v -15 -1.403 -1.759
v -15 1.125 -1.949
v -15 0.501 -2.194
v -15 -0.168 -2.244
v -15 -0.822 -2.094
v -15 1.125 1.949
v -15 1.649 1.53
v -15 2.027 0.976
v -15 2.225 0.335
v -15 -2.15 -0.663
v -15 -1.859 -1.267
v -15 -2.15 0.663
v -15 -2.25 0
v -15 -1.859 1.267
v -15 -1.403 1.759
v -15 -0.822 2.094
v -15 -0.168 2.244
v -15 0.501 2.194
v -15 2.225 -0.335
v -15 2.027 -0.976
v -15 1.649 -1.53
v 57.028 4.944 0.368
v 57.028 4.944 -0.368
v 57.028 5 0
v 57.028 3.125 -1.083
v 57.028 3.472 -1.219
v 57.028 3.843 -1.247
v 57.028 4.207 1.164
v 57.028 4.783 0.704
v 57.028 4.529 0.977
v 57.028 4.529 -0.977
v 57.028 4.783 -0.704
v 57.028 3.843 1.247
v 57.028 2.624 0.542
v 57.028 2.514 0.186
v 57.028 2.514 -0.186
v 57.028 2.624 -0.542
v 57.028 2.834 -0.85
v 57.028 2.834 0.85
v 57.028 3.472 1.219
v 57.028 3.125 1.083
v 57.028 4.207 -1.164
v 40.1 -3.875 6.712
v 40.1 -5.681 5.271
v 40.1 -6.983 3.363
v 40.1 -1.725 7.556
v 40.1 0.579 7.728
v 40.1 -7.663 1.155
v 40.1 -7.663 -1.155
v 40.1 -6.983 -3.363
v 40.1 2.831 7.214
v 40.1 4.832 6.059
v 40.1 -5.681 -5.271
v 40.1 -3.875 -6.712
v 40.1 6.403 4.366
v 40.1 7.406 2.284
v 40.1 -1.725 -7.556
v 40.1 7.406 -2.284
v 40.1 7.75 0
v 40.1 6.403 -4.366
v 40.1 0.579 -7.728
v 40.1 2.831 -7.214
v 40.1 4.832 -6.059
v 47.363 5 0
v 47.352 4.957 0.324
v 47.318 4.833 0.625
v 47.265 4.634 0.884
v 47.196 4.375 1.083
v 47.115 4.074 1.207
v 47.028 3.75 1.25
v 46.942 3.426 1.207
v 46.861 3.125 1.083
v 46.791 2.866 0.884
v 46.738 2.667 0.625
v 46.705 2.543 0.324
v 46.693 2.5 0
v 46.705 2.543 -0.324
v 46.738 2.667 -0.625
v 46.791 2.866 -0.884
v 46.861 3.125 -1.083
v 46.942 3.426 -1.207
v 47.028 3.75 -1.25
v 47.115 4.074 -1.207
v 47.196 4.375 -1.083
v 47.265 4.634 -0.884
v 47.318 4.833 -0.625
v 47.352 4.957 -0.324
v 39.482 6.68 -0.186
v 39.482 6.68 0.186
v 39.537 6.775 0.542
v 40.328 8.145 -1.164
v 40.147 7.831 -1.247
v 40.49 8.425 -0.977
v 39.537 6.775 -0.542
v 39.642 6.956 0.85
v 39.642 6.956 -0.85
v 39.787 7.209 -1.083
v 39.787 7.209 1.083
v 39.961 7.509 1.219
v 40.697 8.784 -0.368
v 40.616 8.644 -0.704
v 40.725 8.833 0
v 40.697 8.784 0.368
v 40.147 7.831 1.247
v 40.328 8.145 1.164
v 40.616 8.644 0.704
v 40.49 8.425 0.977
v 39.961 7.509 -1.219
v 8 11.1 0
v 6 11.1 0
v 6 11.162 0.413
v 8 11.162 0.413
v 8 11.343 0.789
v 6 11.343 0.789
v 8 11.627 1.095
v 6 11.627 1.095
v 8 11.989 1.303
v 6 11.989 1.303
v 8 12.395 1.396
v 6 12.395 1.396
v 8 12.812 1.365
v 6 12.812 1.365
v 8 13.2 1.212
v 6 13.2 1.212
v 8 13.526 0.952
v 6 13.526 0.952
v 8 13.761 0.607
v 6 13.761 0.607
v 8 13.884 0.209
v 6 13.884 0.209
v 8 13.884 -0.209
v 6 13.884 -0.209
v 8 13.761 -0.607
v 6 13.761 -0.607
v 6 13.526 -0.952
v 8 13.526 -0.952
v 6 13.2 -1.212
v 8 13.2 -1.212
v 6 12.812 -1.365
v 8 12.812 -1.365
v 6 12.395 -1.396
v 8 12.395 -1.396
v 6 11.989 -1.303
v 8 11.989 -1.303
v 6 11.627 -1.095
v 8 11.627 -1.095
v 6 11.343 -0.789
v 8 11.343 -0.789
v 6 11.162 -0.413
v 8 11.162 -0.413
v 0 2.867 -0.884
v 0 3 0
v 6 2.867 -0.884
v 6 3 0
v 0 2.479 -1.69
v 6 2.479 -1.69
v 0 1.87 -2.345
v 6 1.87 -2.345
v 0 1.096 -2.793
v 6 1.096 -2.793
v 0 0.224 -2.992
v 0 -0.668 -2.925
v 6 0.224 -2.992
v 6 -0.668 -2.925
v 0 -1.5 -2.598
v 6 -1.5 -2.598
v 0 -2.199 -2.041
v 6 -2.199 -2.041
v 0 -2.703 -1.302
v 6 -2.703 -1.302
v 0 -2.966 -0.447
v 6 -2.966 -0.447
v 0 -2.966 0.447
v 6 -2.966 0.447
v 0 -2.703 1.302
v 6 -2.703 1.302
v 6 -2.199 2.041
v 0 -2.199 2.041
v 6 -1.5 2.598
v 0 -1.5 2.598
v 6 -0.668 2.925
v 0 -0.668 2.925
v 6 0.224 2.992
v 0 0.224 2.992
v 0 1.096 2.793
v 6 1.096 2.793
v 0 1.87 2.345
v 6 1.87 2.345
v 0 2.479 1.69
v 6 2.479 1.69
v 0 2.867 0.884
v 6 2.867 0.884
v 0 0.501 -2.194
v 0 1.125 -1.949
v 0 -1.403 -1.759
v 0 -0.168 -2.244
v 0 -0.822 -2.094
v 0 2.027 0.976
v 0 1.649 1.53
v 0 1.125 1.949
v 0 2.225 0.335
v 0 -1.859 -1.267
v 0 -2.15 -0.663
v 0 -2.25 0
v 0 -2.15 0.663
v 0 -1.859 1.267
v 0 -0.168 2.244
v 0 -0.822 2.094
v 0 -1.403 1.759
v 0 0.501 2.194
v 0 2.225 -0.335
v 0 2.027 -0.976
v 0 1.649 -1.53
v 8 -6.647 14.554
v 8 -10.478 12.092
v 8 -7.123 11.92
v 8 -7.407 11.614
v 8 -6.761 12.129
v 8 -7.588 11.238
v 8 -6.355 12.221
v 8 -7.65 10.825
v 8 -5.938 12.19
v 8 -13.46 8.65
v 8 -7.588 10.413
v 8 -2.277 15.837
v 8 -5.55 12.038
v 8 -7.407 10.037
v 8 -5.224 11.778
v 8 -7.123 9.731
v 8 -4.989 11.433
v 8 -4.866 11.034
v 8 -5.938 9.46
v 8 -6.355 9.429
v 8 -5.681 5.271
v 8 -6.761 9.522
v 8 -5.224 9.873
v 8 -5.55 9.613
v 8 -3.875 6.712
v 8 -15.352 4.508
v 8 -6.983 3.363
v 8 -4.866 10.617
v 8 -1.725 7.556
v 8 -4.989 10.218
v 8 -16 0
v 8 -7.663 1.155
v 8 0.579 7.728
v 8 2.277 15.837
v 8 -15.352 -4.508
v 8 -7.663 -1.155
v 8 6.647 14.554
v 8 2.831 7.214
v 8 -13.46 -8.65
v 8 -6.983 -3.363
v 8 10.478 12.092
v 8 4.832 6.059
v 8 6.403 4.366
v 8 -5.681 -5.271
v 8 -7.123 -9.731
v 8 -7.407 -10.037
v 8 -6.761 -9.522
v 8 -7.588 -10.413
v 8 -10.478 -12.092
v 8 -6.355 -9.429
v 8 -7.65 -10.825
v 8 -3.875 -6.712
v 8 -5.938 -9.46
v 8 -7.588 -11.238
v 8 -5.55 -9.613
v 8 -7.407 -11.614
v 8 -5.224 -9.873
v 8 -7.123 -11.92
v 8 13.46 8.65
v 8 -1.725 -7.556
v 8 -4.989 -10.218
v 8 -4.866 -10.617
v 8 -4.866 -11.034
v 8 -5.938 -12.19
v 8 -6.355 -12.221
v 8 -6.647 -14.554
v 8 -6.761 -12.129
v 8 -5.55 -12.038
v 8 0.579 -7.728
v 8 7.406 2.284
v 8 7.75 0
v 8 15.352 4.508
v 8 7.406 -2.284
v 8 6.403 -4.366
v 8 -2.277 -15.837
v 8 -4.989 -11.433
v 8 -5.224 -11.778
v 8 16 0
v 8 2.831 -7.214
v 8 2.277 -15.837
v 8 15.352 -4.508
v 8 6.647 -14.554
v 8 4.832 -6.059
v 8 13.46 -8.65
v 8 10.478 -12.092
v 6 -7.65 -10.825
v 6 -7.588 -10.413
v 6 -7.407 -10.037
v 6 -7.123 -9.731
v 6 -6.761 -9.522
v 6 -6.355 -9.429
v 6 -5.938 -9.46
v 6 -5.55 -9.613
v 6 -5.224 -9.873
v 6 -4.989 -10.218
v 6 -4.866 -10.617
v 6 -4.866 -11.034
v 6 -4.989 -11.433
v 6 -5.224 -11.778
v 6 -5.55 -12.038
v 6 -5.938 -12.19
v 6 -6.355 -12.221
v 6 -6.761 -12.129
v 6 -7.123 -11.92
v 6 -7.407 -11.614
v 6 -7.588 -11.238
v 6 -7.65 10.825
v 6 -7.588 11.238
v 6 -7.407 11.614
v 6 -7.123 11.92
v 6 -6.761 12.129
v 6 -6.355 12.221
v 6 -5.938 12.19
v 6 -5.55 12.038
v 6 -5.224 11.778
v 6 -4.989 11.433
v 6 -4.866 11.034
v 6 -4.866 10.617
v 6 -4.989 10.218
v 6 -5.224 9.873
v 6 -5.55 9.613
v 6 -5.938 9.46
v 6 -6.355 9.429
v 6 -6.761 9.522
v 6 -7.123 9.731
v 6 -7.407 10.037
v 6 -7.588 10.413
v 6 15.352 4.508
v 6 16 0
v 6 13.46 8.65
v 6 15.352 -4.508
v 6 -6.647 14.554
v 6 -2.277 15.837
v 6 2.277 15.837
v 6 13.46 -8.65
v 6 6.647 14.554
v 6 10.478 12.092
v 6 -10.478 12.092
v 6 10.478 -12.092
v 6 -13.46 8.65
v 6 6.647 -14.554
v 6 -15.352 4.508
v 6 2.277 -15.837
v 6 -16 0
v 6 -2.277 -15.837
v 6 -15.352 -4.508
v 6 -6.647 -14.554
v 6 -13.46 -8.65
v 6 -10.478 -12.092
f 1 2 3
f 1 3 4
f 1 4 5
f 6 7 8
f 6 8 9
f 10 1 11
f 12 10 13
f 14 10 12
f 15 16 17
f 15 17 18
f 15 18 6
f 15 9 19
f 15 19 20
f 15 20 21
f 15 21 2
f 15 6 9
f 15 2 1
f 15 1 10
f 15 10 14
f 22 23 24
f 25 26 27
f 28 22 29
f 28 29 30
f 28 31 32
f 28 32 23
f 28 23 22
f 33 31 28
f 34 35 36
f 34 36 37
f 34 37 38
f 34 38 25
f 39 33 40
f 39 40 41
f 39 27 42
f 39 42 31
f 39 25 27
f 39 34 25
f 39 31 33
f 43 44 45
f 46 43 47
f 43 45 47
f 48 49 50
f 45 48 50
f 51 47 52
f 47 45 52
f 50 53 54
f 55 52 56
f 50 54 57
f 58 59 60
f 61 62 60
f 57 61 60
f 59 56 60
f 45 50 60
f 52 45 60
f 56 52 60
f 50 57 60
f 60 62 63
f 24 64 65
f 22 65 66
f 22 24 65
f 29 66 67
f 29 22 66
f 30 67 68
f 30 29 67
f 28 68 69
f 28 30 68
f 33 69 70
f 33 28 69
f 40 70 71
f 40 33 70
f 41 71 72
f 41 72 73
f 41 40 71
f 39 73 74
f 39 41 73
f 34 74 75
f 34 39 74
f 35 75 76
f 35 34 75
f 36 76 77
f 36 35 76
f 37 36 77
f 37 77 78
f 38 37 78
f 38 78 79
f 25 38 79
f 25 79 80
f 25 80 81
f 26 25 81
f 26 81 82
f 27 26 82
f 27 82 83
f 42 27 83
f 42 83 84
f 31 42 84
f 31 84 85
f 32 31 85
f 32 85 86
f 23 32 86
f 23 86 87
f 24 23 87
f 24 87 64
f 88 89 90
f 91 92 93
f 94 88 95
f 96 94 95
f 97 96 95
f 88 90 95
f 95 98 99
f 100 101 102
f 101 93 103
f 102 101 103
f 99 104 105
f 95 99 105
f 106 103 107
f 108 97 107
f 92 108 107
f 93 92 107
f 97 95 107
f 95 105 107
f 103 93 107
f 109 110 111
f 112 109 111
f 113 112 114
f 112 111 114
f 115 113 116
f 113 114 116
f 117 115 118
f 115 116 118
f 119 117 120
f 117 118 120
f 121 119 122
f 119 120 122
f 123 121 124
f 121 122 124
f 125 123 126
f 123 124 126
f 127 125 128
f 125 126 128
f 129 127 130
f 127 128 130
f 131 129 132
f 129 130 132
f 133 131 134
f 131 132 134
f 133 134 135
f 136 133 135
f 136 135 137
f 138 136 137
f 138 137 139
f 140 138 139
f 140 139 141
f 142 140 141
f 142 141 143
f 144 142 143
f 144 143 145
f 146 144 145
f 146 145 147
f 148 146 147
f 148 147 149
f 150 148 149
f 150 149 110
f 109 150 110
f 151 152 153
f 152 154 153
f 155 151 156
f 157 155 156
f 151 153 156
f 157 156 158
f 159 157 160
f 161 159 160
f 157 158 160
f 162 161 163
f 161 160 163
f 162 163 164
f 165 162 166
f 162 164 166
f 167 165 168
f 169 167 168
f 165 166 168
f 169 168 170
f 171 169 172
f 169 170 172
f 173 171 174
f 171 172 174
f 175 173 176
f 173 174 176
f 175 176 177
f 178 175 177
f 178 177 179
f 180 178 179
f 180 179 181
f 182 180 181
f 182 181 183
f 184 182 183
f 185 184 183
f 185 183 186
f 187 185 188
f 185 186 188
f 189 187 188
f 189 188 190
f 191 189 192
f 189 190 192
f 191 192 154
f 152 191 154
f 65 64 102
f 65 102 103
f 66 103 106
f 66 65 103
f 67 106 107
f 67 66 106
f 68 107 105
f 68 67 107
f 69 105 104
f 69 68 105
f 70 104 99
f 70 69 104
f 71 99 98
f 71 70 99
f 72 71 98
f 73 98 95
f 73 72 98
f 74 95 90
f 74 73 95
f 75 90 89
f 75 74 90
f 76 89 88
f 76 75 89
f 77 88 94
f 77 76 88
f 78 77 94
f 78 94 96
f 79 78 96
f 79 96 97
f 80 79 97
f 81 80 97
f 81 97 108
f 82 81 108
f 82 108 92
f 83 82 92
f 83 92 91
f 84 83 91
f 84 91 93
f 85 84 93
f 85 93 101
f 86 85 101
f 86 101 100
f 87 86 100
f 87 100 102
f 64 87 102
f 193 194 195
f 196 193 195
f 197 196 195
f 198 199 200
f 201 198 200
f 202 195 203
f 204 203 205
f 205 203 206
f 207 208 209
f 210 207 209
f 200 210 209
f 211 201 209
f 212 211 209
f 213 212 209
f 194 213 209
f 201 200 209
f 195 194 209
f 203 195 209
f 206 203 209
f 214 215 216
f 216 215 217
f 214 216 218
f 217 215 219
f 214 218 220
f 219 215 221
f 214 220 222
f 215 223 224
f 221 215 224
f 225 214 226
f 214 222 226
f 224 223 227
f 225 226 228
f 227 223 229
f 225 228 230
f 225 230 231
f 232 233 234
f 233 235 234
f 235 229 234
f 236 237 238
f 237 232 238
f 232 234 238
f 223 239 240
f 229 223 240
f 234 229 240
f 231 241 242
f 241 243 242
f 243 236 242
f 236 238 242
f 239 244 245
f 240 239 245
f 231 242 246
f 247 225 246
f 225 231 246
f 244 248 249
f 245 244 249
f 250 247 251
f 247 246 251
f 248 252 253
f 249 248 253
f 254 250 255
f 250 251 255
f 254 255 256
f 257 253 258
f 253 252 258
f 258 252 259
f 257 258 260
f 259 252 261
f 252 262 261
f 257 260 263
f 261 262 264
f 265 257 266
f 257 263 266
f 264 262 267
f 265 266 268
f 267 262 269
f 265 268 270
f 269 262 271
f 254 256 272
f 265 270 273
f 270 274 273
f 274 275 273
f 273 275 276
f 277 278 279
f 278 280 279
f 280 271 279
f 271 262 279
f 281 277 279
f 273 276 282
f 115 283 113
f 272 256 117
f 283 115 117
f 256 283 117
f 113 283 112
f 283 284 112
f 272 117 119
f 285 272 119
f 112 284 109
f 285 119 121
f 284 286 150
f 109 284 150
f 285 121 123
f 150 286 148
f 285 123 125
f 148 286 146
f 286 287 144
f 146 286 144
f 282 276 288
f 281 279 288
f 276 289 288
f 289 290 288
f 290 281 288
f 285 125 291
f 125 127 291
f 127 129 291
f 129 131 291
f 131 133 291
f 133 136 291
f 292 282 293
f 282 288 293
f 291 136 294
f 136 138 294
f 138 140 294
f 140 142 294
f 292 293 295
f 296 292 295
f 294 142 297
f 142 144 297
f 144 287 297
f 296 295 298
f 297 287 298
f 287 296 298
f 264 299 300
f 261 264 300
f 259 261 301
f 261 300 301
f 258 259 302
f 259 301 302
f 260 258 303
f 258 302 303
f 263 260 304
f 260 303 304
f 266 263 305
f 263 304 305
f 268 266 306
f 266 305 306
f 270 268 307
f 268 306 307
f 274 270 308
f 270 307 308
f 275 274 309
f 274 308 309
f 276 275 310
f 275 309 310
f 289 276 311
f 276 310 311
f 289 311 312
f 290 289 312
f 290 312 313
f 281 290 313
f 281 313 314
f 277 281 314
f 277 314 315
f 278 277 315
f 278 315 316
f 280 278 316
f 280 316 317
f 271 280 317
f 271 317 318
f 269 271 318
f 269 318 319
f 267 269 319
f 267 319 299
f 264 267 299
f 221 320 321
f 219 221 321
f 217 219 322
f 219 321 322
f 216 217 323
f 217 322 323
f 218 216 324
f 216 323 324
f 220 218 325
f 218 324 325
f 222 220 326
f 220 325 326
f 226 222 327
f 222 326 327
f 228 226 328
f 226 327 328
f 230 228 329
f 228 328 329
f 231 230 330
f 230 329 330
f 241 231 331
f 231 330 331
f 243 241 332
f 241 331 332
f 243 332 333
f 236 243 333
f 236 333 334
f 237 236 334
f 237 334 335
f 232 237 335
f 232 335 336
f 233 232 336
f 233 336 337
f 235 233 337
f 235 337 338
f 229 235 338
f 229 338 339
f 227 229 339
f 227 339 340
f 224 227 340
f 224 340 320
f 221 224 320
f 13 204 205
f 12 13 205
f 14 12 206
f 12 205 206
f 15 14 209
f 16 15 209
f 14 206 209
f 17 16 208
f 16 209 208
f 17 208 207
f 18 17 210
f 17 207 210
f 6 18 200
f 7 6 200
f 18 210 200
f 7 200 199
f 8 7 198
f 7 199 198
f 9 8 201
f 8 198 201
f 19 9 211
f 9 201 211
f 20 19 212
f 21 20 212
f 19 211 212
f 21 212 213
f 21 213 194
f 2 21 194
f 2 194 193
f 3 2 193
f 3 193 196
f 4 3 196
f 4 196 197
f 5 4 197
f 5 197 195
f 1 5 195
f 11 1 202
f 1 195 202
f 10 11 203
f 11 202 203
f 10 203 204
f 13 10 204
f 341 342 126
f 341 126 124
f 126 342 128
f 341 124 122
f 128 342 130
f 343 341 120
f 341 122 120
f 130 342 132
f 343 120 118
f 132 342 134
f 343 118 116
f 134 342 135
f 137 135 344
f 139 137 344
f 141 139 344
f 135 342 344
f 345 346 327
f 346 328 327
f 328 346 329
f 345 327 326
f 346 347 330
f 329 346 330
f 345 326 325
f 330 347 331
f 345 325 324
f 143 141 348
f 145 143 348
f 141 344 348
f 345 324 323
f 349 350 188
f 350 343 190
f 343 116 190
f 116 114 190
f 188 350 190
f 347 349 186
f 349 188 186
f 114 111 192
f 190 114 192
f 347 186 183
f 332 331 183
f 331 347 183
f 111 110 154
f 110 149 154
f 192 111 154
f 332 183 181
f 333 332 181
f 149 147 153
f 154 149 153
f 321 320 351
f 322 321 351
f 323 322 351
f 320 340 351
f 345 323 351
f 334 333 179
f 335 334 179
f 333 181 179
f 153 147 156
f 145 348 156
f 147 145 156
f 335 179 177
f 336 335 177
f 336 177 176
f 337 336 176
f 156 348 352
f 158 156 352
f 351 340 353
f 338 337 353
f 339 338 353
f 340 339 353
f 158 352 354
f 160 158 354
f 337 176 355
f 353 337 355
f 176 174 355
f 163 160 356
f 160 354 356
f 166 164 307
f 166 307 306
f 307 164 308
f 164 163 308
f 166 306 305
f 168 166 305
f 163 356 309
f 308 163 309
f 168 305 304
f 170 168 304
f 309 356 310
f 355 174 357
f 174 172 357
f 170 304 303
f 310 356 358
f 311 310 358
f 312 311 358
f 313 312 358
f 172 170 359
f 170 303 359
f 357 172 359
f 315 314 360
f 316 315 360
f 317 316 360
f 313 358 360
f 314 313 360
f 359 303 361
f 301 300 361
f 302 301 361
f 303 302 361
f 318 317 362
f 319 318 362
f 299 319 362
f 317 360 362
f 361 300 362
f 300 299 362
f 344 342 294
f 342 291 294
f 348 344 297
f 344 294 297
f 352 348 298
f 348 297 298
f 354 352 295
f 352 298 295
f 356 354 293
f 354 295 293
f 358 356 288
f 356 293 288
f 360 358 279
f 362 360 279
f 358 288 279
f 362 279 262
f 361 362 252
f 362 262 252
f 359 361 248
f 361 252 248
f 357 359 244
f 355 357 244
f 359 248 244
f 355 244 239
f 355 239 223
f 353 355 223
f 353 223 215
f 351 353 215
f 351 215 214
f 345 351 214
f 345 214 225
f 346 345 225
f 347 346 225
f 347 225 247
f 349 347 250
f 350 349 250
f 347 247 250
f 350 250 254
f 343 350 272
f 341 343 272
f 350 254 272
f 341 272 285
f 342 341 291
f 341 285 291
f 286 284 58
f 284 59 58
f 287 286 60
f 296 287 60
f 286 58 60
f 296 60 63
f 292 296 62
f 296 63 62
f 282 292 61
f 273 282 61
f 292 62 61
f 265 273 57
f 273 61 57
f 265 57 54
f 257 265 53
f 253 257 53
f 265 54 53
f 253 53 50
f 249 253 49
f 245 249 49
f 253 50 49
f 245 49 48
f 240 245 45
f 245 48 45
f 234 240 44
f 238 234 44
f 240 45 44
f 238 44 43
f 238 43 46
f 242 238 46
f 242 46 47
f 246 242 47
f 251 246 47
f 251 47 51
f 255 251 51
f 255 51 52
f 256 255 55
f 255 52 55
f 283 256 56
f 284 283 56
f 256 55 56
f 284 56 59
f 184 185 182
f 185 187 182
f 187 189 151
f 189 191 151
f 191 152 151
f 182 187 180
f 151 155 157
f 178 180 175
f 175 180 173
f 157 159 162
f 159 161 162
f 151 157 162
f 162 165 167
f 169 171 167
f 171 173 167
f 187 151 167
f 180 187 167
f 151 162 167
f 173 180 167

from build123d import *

# Parameters (mm, degrees)
SKETCH_2_R          = 2.25
EXTRUDE_1_DEPTH     = 15
SKETCH_3_R          = 1.4
CUT_EXTRUDE_1_DEPTH = 41.924442574
SWEEP_1_PROFILE_R   = 1.25


with BuildPart() as part:
    # 草图1 → 旋转1 (revolve)
    with BuildSketch(Plane.XY):
        Polygon((0, 0), (0, 3), (6, 3), (6, 16), (8, 16), (8, 7.75), (40.1, 7.75), (40.1, 0), align=None)
    revolve(axis=Axis((40.1, 0, 0), (-1, 0, 0)))

    # 草图3 → 切除-拉伸1 (cut, through all)
    with BuildSketch(Plane.ZY.offset(-6)):
        with Locations(Location((0, 12.5, 0), (0, 0, 270))):
            Circle(SKETCH_3_R)
        with Locations(Location((10.825317547, -6.25, 0), (0, 0, 270))):
            Circle(SKETCH_3_R)
        with Locations(Location((-10.825317547, -6.25, 0), (0, 0, 270))):
            Circle(SKETCH_3_R)
    extrude(amount=-CUT_EXTRUDE_1_DEPTH, mode=Mode.SUBTRACT)


with BuildPart() as body_2:
    # 草图2 → 凸台-拉伸1 (new body)
    with BuildSketch(Plane.ZY):
        with Locations(Location((0, 0, 0), (0, 0, 270))):
            Circle(SKETCH_2_R)
    extrude(amount=EXTRUDE_1_DEPTH)


with BuildPart() as body_3:
    # 扫描1: sweep along a path in 草图4
    with BuildLine(Plane.XY) as sweep_1_path:
        Line((40.1, 7.75), (47.02820323, 3.75))
        Line((47.02820323, 3.75), (57.02820323, 3.75))
    # 扫描1 profile (on start of the path) → 扫描1 (sweep)
    with BuildSketch(Plane(origin=(40.1, 7.75, 0), x_dir=(0.4999999999999976, 0.8660254037844402, 0), z_dir=(0.8660254037844402, -0.4999999999999976, 0))):
        Circle(SWEEP_1_PROFILE_R)
    sweep(path=sweep_1_path.line, transition=Transition.RIGHT)


solid = Compound([part.part, body_2.part, body_3.part])
